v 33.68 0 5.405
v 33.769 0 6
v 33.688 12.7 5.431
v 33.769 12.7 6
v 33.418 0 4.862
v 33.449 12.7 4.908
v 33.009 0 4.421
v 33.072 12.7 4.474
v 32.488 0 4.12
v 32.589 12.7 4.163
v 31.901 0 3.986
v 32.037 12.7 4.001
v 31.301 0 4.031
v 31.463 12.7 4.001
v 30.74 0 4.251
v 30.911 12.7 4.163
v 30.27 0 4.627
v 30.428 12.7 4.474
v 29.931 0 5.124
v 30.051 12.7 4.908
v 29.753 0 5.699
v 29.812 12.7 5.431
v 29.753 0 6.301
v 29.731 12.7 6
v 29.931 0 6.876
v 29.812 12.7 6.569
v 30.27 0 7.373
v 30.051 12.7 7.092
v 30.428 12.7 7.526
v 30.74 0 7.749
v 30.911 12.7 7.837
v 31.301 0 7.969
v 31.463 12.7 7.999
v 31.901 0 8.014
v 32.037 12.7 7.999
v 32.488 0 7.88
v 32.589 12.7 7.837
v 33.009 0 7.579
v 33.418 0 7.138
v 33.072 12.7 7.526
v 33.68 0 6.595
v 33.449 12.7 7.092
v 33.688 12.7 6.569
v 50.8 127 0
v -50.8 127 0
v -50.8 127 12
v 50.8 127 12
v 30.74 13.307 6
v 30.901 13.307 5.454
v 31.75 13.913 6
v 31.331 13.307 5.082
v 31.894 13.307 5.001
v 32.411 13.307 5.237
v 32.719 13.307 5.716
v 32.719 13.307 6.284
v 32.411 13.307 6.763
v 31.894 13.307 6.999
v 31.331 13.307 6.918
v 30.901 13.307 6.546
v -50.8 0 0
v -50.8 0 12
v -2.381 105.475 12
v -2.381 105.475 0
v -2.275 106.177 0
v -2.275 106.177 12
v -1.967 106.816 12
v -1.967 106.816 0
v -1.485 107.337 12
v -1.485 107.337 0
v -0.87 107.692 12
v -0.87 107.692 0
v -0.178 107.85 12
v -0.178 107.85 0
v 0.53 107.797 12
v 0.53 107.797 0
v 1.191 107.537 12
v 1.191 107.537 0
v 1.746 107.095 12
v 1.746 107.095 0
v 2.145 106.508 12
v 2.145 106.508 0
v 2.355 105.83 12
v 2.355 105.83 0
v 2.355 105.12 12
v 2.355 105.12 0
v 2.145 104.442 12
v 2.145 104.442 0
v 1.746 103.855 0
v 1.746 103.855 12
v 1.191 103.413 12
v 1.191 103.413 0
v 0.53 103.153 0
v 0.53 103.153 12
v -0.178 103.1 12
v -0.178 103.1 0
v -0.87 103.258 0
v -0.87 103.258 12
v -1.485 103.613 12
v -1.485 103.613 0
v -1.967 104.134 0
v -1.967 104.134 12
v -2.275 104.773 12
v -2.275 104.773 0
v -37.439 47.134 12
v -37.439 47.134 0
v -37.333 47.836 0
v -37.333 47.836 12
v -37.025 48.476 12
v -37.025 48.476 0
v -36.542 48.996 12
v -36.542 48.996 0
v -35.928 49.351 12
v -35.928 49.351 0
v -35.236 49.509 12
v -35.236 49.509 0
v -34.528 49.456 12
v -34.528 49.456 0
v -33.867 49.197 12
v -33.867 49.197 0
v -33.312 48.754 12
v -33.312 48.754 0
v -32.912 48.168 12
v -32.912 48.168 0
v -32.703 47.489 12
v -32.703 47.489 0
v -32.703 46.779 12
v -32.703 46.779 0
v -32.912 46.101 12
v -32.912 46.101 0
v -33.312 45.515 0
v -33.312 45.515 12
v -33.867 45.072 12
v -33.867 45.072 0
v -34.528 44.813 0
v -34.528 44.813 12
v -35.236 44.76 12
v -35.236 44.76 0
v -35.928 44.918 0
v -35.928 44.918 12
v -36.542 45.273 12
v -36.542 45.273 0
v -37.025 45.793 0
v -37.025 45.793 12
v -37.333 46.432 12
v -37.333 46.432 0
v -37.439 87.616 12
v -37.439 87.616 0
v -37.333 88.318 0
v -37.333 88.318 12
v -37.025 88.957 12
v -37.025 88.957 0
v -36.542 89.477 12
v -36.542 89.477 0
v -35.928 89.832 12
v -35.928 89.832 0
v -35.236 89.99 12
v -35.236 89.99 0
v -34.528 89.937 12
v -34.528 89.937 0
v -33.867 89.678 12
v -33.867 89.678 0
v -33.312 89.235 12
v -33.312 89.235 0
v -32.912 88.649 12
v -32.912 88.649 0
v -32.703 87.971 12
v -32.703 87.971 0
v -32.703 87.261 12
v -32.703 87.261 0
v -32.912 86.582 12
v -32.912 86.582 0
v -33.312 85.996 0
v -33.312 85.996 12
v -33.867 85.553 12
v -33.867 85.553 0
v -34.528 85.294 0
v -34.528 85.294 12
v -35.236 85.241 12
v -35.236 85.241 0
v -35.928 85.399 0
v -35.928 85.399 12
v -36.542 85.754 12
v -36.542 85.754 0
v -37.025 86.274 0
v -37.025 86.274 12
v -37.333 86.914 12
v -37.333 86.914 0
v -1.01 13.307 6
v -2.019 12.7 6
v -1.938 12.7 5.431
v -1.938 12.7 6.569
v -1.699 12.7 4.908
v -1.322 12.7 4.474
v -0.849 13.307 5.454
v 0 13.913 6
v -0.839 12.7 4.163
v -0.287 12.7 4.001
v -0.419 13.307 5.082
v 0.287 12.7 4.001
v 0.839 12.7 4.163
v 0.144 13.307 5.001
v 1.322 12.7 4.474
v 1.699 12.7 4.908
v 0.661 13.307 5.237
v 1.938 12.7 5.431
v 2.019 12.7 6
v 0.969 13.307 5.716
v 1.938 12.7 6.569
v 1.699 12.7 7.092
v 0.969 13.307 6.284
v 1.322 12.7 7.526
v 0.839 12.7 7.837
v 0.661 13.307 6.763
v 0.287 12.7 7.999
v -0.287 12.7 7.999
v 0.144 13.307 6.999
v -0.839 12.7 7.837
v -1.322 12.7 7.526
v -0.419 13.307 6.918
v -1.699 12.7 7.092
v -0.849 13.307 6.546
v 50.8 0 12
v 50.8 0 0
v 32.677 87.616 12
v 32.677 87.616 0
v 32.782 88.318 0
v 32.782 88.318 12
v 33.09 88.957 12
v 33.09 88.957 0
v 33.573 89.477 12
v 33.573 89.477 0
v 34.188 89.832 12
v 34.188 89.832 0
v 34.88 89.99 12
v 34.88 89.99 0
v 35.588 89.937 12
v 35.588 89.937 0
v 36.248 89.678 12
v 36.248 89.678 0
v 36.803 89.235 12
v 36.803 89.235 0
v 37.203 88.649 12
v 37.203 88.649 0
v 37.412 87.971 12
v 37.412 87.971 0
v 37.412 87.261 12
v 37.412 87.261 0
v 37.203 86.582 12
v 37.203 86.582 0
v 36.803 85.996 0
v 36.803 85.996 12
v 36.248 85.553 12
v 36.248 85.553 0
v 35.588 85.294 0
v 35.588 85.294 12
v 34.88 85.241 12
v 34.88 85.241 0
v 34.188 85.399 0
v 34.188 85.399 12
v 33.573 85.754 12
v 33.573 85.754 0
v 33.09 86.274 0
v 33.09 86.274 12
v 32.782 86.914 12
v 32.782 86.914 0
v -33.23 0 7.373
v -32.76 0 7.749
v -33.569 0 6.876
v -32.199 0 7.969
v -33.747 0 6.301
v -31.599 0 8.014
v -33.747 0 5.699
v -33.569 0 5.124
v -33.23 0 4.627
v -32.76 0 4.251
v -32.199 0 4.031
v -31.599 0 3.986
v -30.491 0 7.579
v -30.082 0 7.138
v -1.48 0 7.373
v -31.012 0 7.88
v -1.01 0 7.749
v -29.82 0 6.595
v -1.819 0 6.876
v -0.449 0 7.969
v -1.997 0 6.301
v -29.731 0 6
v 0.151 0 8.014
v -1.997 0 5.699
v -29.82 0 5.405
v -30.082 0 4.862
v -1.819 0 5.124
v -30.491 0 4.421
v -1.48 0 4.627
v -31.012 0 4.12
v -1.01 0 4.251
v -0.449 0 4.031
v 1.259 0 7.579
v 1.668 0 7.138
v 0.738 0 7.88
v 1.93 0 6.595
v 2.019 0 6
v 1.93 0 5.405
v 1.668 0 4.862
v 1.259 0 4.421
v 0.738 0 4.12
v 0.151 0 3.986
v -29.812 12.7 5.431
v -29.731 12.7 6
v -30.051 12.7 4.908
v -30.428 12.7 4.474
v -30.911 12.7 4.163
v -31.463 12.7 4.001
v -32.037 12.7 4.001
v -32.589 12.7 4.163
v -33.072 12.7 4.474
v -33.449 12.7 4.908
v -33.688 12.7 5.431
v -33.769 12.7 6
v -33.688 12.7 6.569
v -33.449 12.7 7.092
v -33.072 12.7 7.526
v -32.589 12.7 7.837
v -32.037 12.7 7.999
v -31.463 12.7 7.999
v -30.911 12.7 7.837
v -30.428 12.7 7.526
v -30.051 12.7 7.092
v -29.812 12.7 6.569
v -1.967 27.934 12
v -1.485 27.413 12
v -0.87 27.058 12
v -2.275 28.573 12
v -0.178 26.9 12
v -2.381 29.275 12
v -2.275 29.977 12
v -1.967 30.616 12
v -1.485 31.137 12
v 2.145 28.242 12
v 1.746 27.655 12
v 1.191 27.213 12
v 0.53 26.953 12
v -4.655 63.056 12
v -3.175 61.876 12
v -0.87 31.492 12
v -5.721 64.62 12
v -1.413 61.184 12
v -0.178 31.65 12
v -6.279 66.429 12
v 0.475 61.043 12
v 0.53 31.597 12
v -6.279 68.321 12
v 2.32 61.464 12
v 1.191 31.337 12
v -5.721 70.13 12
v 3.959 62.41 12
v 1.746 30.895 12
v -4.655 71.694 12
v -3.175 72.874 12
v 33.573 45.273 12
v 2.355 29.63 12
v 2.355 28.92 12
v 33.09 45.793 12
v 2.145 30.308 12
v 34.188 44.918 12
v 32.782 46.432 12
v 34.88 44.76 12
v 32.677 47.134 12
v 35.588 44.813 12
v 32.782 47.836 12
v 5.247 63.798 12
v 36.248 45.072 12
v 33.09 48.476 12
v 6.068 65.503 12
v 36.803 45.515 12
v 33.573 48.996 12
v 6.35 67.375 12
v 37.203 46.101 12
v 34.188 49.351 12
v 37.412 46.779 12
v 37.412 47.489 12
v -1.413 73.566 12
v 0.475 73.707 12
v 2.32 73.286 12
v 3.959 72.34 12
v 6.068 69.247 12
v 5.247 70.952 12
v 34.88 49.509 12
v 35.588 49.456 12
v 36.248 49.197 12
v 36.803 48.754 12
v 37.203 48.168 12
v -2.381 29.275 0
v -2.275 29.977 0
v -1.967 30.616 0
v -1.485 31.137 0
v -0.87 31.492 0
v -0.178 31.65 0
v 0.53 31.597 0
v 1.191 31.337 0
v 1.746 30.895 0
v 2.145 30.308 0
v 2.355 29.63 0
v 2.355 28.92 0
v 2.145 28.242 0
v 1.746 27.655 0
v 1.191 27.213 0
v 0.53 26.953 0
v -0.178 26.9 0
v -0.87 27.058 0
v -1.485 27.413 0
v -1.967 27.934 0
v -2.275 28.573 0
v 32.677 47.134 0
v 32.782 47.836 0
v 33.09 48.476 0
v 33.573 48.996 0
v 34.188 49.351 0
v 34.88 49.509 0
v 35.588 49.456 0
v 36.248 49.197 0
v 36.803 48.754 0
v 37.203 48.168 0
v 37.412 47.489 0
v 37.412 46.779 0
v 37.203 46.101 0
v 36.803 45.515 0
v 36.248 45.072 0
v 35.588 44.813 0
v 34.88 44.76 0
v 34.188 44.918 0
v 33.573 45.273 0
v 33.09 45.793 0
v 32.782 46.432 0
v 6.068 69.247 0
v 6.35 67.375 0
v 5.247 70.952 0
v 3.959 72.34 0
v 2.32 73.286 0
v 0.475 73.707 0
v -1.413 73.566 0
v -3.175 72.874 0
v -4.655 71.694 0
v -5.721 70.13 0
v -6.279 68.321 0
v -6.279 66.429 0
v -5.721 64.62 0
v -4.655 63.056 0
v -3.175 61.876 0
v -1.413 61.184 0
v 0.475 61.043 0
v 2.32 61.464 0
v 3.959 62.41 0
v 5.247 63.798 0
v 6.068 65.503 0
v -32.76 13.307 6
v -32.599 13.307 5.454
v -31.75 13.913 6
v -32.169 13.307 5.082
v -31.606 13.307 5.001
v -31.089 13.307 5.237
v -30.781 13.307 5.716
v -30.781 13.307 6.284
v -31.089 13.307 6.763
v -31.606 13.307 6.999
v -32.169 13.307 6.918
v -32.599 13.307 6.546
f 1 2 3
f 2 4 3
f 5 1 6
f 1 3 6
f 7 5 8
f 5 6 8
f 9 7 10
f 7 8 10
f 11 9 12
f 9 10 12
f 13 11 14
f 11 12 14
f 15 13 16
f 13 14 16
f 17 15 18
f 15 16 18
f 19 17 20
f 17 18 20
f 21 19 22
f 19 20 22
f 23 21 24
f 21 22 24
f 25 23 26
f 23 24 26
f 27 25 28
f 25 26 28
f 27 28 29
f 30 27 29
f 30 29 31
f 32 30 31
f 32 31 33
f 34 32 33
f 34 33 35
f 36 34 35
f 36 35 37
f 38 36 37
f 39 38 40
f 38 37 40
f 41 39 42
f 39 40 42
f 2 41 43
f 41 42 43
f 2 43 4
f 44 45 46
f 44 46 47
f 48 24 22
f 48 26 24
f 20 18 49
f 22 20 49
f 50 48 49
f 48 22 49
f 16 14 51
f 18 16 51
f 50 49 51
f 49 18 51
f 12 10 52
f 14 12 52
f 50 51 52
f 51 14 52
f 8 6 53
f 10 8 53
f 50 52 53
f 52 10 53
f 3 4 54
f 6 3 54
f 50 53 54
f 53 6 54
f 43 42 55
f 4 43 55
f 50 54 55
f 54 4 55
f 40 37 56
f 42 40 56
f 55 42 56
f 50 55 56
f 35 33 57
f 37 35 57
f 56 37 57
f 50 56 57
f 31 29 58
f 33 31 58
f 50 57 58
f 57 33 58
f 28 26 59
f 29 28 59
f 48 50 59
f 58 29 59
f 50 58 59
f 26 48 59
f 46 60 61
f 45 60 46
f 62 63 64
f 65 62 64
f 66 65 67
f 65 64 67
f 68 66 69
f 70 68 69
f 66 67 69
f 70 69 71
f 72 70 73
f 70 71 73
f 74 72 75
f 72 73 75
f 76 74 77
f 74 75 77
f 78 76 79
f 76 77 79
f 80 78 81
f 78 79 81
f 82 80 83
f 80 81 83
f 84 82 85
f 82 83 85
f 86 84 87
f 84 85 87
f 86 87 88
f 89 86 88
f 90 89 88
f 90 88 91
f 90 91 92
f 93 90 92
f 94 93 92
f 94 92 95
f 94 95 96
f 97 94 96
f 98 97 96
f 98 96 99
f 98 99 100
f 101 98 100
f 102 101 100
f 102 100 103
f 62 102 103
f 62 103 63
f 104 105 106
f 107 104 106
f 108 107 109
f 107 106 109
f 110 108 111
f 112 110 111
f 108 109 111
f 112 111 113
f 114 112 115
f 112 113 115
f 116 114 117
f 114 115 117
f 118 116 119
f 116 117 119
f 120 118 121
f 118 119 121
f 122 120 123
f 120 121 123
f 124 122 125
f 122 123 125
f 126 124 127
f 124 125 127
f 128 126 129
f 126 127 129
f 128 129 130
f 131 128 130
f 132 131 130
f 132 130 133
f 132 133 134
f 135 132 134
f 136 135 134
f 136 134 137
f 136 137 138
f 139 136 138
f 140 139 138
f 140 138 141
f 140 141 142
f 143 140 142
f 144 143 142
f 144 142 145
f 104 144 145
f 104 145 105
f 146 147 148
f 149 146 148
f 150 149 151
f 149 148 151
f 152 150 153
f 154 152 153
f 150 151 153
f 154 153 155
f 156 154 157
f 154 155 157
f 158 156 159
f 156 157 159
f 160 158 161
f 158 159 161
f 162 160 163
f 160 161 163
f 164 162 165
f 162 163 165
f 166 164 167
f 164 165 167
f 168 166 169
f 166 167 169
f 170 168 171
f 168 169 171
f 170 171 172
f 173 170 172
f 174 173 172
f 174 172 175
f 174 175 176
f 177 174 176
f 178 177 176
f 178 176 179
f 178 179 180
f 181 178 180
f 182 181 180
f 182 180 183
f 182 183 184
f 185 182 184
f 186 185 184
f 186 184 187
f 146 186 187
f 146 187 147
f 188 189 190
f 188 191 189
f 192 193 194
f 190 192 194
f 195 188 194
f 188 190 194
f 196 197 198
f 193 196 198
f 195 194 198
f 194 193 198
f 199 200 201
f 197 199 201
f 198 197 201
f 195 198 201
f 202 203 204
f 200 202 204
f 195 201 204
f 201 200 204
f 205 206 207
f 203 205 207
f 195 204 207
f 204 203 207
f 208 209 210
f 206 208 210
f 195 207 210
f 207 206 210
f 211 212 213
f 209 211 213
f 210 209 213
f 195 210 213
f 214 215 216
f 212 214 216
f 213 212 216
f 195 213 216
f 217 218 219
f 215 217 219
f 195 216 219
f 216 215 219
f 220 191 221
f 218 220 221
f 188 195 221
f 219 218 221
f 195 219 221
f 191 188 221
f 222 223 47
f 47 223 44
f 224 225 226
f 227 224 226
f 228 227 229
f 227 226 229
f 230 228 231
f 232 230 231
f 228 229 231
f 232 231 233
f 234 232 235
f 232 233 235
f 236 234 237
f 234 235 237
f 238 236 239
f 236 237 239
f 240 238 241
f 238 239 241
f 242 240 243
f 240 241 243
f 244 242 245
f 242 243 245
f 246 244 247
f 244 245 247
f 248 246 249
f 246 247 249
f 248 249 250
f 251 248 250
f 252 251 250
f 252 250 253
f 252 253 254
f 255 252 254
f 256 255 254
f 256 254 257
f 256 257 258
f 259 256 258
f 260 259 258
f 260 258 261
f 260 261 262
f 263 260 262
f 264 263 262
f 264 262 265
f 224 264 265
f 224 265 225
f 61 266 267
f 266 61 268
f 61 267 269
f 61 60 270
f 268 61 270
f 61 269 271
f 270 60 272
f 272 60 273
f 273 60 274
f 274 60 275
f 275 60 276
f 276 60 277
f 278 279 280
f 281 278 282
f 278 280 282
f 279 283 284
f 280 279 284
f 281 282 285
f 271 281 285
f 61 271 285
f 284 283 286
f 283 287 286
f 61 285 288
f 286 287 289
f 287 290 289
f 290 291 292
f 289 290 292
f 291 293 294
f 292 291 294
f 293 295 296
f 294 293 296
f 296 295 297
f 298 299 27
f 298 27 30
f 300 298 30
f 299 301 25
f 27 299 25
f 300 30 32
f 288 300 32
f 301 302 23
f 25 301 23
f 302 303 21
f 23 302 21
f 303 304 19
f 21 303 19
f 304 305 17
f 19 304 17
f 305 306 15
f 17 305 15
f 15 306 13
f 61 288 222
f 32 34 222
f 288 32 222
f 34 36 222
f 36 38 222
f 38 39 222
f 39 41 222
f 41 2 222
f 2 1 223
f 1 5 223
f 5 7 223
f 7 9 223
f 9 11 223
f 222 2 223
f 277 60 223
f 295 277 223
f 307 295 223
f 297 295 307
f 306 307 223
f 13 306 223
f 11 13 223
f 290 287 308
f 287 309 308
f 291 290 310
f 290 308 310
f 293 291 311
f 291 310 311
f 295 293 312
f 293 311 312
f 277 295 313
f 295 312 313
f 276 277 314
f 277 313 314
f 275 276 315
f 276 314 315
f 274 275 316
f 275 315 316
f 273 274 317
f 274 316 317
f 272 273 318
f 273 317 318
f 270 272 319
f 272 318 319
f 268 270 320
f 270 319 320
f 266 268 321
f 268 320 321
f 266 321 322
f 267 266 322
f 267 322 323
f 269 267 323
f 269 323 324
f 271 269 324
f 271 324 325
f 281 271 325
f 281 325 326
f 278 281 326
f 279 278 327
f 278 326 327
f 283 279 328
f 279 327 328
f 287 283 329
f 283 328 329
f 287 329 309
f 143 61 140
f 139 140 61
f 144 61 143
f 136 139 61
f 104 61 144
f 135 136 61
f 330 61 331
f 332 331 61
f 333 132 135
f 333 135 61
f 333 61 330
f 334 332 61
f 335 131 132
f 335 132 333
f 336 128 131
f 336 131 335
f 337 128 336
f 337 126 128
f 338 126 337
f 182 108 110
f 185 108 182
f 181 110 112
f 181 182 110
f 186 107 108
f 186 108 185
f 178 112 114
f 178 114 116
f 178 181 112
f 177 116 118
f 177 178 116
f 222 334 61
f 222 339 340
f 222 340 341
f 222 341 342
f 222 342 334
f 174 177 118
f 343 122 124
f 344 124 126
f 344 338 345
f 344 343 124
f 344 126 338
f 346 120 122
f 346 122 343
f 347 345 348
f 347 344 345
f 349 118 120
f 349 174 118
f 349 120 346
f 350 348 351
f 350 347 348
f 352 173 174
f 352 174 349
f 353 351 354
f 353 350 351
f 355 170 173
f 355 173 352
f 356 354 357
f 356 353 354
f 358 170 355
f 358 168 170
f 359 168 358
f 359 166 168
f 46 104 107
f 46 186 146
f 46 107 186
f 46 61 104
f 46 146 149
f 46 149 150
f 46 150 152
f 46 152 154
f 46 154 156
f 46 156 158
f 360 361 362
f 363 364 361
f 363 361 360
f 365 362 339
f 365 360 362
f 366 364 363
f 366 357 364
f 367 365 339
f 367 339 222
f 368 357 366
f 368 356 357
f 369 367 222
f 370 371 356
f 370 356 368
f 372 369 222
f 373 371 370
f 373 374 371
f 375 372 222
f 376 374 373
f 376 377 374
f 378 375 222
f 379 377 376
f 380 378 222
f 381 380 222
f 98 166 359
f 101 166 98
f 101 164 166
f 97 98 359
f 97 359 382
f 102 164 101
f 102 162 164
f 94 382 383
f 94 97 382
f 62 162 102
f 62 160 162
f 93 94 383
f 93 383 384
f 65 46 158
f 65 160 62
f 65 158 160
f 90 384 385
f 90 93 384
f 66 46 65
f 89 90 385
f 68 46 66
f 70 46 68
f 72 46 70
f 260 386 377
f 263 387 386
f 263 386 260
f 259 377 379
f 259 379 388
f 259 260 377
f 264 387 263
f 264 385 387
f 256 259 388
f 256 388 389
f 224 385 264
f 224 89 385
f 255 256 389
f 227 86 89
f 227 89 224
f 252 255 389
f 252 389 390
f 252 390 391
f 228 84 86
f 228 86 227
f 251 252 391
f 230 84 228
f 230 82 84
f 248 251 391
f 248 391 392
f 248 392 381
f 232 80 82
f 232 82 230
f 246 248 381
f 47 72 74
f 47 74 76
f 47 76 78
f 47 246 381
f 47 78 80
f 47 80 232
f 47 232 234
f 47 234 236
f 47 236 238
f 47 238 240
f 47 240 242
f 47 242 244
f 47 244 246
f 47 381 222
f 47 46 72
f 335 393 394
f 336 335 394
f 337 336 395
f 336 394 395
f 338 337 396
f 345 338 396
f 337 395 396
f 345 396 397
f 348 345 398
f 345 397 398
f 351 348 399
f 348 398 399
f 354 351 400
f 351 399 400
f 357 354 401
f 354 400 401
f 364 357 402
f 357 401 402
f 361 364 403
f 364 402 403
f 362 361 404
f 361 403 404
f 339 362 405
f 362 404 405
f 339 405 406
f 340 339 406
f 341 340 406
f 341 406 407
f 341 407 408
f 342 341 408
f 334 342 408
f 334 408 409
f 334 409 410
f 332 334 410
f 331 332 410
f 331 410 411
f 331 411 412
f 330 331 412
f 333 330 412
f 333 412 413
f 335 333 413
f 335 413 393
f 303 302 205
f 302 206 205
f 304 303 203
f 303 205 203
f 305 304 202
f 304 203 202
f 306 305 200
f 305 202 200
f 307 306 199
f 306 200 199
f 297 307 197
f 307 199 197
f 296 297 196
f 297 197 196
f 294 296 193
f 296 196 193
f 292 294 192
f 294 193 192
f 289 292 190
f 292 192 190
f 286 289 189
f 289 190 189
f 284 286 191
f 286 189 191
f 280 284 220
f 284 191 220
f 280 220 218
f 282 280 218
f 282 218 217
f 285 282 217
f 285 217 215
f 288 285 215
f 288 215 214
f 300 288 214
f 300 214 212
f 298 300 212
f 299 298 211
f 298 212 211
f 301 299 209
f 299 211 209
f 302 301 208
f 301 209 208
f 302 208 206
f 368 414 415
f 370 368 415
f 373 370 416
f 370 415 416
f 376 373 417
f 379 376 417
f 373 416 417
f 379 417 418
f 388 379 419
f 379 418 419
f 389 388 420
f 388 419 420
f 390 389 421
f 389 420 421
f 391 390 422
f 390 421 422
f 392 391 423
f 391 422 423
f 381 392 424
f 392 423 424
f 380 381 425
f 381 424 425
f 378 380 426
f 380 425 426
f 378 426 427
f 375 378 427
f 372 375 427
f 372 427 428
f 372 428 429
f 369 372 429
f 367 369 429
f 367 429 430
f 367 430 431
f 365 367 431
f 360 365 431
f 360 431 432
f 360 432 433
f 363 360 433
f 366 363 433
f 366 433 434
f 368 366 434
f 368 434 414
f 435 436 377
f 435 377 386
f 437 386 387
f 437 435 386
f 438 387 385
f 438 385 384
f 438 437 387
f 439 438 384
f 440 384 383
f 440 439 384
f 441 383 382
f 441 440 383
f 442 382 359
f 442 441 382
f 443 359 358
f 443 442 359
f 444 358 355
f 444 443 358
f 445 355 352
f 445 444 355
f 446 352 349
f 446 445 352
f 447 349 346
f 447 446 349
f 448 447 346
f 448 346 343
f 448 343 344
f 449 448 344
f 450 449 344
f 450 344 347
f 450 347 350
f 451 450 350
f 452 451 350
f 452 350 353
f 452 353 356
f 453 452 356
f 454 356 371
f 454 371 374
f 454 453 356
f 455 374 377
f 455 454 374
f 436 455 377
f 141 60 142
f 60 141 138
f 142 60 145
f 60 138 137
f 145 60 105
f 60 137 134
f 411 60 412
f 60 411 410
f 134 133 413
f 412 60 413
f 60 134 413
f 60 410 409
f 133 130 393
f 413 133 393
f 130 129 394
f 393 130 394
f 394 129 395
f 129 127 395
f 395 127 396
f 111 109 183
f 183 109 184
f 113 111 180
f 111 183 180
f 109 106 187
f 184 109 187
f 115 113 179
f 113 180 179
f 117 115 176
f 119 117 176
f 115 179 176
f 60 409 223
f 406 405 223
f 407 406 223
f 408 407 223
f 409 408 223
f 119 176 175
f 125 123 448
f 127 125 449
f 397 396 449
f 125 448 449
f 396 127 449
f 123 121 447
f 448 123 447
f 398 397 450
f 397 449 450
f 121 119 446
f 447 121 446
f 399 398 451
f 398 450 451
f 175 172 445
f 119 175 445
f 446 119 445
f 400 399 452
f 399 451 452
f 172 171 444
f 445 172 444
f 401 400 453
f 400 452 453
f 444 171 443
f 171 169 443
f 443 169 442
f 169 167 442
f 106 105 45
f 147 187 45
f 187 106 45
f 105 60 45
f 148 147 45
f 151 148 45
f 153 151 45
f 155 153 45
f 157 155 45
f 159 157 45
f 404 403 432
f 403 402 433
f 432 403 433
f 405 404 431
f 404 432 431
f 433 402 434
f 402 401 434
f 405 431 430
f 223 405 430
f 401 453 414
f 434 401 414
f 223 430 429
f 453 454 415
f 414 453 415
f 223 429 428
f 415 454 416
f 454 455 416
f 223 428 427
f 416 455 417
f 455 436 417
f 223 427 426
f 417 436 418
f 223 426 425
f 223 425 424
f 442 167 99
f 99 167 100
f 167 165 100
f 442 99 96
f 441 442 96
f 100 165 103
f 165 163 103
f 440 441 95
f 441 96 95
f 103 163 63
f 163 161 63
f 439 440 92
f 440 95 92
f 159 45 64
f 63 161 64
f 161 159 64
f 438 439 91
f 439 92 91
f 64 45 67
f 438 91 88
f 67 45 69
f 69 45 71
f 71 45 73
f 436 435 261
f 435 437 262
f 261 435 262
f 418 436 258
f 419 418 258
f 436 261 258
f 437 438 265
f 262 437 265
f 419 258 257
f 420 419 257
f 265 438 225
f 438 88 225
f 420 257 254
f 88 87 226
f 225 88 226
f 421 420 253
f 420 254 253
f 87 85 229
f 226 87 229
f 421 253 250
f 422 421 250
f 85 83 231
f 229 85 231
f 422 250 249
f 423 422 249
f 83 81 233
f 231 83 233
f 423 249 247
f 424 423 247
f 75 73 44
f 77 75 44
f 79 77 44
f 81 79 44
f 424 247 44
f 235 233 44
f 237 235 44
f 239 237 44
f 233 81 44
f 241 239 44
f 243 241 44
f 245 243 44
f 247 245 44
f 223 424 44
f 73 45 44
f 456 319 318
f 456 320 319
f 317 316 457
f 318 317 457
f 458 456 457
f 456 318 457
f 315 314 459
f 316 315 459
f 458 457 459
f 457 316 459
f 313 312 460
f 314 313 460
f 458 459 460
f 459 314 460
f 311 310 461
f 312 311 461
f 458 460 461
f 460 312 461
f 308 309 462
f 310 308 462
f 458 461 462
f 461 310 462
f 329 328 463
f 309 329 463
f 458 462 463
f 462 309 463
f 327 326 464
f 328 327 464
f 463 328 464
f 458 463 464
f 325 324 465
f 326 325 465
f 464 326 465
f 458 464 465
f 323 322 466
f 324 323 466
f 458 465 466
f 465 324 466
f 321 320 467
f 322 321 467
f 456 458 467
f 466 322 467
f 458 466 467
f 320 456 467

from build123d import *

# Parameters (mm, degrees)
SKETCH1_W                  = 101.6
SKETCH1_H                  = 127
SKETCH1_R                  = 6.35
BOSS_EXTRUDE1_DEPTH        = 12.0000014
SKETCH2_R                  = 2.38125
CUT_EXTRUDE1_DEPTH         = 138.308557758
SKETCH3_R                  = 1.27
CUT_EXTRUDE2_DEPTH         = 12.7
F_10_32_TAPPED_HOLE3_D     = 4.0386
F_10_32_TAPPED_HOLE3_DEPTH = 12.7
F_10_32_TAPPED_HOLE3_TIP   = 1.213317848


with BuildPart() as part:
    # Sketch1 → Boss-Extrude1 (new body)
    with BuildSketch(Plane.XY):
        with Locations((0, 63.5)):
            Rectangle(SKETCH1_W, SKETCH1_H)
        with Locations((0, 67.3749986)):
            Circle(SKETCH1_R, mode=Mode.SUBTRACT)
    extrude(amount=BOSS_EXTRUDE1_DEPTH)

    # Sketch2 → Cut-Extrude1 (cut, through all)
    with BuildSketch(Plane(origin=(0, 0, 0), x_dir=(-1, 0, 0), z_dir=(0, 0, -1))):
        with Locations((0, 105.4749986)):
            Circle(SKETCH2_R)
        with Locations((0, 29.2749986)):
            Circle(SKETCH2_R)
        with Locations((-35.057790877, 87.6156236)):
            Circle(SKETCH2_R)
        with Locations((-35.057790877, 47.1343736)):
            Circle(SKETCH2_R)
        with Locations((35.057790877, 47.1343736)):
            Circle(SKETCH2_R)
        with Locations((35.057790877, 87.6156236)):
            Circle(SKETCH2_R)
    extrude(amount=-CUT_EXTRUDE1_DEPTH, mode=Mode.SUBTRACT)

    # Sketch3 → Cut-Extrude2 (cut)
    with BuildSketch(Plane.XZ):
        with Locations(Location((31.75, 6.0000007, 0), (0, 0, 270))):
            Circle(SKETCH3_R)
        with Locations(Location((0, 6.0000007, 0), (0, 0, 270))):
            Circle(SKETCH3_R)
        with Locations(Location((-31.75, 6.0000007, 0), (0, 0, 270))):
            Circle(SKETCH3_R)
    extrude(amount=-CUT_EXTRUDE2_DEPTH, mode=Mode.SUBTRACT)

    # #10-32 Tapped Hole3
    with Locations(Plane(origin=(0, 0, 0), x_dir=(-1, 0, 0), z_dir=(0, -1, 0))):
        with Locations((-31.75, -6.0000007), (0, -6.0000007), (31.75, -6.0000007)):
            Hole(F_10_32_TAPPED_HOLE3_D / 2, depth=F_10_32_TAPPED_HOLE3_DEPTH)
            with Locations((0, 0, -(F_10_32_TAPPED_HOLE3_DEPTH + F_10_32_TAPPED_HOLE3_TIP / 2))):  # 118° drill point
                Cone(0, F_10_32_TAPPED_HOLE3_D / 2, F_10_32_TAPPED_HOLE3_TIP, mode=Mode.SUBTRACT)


solid = part.part
